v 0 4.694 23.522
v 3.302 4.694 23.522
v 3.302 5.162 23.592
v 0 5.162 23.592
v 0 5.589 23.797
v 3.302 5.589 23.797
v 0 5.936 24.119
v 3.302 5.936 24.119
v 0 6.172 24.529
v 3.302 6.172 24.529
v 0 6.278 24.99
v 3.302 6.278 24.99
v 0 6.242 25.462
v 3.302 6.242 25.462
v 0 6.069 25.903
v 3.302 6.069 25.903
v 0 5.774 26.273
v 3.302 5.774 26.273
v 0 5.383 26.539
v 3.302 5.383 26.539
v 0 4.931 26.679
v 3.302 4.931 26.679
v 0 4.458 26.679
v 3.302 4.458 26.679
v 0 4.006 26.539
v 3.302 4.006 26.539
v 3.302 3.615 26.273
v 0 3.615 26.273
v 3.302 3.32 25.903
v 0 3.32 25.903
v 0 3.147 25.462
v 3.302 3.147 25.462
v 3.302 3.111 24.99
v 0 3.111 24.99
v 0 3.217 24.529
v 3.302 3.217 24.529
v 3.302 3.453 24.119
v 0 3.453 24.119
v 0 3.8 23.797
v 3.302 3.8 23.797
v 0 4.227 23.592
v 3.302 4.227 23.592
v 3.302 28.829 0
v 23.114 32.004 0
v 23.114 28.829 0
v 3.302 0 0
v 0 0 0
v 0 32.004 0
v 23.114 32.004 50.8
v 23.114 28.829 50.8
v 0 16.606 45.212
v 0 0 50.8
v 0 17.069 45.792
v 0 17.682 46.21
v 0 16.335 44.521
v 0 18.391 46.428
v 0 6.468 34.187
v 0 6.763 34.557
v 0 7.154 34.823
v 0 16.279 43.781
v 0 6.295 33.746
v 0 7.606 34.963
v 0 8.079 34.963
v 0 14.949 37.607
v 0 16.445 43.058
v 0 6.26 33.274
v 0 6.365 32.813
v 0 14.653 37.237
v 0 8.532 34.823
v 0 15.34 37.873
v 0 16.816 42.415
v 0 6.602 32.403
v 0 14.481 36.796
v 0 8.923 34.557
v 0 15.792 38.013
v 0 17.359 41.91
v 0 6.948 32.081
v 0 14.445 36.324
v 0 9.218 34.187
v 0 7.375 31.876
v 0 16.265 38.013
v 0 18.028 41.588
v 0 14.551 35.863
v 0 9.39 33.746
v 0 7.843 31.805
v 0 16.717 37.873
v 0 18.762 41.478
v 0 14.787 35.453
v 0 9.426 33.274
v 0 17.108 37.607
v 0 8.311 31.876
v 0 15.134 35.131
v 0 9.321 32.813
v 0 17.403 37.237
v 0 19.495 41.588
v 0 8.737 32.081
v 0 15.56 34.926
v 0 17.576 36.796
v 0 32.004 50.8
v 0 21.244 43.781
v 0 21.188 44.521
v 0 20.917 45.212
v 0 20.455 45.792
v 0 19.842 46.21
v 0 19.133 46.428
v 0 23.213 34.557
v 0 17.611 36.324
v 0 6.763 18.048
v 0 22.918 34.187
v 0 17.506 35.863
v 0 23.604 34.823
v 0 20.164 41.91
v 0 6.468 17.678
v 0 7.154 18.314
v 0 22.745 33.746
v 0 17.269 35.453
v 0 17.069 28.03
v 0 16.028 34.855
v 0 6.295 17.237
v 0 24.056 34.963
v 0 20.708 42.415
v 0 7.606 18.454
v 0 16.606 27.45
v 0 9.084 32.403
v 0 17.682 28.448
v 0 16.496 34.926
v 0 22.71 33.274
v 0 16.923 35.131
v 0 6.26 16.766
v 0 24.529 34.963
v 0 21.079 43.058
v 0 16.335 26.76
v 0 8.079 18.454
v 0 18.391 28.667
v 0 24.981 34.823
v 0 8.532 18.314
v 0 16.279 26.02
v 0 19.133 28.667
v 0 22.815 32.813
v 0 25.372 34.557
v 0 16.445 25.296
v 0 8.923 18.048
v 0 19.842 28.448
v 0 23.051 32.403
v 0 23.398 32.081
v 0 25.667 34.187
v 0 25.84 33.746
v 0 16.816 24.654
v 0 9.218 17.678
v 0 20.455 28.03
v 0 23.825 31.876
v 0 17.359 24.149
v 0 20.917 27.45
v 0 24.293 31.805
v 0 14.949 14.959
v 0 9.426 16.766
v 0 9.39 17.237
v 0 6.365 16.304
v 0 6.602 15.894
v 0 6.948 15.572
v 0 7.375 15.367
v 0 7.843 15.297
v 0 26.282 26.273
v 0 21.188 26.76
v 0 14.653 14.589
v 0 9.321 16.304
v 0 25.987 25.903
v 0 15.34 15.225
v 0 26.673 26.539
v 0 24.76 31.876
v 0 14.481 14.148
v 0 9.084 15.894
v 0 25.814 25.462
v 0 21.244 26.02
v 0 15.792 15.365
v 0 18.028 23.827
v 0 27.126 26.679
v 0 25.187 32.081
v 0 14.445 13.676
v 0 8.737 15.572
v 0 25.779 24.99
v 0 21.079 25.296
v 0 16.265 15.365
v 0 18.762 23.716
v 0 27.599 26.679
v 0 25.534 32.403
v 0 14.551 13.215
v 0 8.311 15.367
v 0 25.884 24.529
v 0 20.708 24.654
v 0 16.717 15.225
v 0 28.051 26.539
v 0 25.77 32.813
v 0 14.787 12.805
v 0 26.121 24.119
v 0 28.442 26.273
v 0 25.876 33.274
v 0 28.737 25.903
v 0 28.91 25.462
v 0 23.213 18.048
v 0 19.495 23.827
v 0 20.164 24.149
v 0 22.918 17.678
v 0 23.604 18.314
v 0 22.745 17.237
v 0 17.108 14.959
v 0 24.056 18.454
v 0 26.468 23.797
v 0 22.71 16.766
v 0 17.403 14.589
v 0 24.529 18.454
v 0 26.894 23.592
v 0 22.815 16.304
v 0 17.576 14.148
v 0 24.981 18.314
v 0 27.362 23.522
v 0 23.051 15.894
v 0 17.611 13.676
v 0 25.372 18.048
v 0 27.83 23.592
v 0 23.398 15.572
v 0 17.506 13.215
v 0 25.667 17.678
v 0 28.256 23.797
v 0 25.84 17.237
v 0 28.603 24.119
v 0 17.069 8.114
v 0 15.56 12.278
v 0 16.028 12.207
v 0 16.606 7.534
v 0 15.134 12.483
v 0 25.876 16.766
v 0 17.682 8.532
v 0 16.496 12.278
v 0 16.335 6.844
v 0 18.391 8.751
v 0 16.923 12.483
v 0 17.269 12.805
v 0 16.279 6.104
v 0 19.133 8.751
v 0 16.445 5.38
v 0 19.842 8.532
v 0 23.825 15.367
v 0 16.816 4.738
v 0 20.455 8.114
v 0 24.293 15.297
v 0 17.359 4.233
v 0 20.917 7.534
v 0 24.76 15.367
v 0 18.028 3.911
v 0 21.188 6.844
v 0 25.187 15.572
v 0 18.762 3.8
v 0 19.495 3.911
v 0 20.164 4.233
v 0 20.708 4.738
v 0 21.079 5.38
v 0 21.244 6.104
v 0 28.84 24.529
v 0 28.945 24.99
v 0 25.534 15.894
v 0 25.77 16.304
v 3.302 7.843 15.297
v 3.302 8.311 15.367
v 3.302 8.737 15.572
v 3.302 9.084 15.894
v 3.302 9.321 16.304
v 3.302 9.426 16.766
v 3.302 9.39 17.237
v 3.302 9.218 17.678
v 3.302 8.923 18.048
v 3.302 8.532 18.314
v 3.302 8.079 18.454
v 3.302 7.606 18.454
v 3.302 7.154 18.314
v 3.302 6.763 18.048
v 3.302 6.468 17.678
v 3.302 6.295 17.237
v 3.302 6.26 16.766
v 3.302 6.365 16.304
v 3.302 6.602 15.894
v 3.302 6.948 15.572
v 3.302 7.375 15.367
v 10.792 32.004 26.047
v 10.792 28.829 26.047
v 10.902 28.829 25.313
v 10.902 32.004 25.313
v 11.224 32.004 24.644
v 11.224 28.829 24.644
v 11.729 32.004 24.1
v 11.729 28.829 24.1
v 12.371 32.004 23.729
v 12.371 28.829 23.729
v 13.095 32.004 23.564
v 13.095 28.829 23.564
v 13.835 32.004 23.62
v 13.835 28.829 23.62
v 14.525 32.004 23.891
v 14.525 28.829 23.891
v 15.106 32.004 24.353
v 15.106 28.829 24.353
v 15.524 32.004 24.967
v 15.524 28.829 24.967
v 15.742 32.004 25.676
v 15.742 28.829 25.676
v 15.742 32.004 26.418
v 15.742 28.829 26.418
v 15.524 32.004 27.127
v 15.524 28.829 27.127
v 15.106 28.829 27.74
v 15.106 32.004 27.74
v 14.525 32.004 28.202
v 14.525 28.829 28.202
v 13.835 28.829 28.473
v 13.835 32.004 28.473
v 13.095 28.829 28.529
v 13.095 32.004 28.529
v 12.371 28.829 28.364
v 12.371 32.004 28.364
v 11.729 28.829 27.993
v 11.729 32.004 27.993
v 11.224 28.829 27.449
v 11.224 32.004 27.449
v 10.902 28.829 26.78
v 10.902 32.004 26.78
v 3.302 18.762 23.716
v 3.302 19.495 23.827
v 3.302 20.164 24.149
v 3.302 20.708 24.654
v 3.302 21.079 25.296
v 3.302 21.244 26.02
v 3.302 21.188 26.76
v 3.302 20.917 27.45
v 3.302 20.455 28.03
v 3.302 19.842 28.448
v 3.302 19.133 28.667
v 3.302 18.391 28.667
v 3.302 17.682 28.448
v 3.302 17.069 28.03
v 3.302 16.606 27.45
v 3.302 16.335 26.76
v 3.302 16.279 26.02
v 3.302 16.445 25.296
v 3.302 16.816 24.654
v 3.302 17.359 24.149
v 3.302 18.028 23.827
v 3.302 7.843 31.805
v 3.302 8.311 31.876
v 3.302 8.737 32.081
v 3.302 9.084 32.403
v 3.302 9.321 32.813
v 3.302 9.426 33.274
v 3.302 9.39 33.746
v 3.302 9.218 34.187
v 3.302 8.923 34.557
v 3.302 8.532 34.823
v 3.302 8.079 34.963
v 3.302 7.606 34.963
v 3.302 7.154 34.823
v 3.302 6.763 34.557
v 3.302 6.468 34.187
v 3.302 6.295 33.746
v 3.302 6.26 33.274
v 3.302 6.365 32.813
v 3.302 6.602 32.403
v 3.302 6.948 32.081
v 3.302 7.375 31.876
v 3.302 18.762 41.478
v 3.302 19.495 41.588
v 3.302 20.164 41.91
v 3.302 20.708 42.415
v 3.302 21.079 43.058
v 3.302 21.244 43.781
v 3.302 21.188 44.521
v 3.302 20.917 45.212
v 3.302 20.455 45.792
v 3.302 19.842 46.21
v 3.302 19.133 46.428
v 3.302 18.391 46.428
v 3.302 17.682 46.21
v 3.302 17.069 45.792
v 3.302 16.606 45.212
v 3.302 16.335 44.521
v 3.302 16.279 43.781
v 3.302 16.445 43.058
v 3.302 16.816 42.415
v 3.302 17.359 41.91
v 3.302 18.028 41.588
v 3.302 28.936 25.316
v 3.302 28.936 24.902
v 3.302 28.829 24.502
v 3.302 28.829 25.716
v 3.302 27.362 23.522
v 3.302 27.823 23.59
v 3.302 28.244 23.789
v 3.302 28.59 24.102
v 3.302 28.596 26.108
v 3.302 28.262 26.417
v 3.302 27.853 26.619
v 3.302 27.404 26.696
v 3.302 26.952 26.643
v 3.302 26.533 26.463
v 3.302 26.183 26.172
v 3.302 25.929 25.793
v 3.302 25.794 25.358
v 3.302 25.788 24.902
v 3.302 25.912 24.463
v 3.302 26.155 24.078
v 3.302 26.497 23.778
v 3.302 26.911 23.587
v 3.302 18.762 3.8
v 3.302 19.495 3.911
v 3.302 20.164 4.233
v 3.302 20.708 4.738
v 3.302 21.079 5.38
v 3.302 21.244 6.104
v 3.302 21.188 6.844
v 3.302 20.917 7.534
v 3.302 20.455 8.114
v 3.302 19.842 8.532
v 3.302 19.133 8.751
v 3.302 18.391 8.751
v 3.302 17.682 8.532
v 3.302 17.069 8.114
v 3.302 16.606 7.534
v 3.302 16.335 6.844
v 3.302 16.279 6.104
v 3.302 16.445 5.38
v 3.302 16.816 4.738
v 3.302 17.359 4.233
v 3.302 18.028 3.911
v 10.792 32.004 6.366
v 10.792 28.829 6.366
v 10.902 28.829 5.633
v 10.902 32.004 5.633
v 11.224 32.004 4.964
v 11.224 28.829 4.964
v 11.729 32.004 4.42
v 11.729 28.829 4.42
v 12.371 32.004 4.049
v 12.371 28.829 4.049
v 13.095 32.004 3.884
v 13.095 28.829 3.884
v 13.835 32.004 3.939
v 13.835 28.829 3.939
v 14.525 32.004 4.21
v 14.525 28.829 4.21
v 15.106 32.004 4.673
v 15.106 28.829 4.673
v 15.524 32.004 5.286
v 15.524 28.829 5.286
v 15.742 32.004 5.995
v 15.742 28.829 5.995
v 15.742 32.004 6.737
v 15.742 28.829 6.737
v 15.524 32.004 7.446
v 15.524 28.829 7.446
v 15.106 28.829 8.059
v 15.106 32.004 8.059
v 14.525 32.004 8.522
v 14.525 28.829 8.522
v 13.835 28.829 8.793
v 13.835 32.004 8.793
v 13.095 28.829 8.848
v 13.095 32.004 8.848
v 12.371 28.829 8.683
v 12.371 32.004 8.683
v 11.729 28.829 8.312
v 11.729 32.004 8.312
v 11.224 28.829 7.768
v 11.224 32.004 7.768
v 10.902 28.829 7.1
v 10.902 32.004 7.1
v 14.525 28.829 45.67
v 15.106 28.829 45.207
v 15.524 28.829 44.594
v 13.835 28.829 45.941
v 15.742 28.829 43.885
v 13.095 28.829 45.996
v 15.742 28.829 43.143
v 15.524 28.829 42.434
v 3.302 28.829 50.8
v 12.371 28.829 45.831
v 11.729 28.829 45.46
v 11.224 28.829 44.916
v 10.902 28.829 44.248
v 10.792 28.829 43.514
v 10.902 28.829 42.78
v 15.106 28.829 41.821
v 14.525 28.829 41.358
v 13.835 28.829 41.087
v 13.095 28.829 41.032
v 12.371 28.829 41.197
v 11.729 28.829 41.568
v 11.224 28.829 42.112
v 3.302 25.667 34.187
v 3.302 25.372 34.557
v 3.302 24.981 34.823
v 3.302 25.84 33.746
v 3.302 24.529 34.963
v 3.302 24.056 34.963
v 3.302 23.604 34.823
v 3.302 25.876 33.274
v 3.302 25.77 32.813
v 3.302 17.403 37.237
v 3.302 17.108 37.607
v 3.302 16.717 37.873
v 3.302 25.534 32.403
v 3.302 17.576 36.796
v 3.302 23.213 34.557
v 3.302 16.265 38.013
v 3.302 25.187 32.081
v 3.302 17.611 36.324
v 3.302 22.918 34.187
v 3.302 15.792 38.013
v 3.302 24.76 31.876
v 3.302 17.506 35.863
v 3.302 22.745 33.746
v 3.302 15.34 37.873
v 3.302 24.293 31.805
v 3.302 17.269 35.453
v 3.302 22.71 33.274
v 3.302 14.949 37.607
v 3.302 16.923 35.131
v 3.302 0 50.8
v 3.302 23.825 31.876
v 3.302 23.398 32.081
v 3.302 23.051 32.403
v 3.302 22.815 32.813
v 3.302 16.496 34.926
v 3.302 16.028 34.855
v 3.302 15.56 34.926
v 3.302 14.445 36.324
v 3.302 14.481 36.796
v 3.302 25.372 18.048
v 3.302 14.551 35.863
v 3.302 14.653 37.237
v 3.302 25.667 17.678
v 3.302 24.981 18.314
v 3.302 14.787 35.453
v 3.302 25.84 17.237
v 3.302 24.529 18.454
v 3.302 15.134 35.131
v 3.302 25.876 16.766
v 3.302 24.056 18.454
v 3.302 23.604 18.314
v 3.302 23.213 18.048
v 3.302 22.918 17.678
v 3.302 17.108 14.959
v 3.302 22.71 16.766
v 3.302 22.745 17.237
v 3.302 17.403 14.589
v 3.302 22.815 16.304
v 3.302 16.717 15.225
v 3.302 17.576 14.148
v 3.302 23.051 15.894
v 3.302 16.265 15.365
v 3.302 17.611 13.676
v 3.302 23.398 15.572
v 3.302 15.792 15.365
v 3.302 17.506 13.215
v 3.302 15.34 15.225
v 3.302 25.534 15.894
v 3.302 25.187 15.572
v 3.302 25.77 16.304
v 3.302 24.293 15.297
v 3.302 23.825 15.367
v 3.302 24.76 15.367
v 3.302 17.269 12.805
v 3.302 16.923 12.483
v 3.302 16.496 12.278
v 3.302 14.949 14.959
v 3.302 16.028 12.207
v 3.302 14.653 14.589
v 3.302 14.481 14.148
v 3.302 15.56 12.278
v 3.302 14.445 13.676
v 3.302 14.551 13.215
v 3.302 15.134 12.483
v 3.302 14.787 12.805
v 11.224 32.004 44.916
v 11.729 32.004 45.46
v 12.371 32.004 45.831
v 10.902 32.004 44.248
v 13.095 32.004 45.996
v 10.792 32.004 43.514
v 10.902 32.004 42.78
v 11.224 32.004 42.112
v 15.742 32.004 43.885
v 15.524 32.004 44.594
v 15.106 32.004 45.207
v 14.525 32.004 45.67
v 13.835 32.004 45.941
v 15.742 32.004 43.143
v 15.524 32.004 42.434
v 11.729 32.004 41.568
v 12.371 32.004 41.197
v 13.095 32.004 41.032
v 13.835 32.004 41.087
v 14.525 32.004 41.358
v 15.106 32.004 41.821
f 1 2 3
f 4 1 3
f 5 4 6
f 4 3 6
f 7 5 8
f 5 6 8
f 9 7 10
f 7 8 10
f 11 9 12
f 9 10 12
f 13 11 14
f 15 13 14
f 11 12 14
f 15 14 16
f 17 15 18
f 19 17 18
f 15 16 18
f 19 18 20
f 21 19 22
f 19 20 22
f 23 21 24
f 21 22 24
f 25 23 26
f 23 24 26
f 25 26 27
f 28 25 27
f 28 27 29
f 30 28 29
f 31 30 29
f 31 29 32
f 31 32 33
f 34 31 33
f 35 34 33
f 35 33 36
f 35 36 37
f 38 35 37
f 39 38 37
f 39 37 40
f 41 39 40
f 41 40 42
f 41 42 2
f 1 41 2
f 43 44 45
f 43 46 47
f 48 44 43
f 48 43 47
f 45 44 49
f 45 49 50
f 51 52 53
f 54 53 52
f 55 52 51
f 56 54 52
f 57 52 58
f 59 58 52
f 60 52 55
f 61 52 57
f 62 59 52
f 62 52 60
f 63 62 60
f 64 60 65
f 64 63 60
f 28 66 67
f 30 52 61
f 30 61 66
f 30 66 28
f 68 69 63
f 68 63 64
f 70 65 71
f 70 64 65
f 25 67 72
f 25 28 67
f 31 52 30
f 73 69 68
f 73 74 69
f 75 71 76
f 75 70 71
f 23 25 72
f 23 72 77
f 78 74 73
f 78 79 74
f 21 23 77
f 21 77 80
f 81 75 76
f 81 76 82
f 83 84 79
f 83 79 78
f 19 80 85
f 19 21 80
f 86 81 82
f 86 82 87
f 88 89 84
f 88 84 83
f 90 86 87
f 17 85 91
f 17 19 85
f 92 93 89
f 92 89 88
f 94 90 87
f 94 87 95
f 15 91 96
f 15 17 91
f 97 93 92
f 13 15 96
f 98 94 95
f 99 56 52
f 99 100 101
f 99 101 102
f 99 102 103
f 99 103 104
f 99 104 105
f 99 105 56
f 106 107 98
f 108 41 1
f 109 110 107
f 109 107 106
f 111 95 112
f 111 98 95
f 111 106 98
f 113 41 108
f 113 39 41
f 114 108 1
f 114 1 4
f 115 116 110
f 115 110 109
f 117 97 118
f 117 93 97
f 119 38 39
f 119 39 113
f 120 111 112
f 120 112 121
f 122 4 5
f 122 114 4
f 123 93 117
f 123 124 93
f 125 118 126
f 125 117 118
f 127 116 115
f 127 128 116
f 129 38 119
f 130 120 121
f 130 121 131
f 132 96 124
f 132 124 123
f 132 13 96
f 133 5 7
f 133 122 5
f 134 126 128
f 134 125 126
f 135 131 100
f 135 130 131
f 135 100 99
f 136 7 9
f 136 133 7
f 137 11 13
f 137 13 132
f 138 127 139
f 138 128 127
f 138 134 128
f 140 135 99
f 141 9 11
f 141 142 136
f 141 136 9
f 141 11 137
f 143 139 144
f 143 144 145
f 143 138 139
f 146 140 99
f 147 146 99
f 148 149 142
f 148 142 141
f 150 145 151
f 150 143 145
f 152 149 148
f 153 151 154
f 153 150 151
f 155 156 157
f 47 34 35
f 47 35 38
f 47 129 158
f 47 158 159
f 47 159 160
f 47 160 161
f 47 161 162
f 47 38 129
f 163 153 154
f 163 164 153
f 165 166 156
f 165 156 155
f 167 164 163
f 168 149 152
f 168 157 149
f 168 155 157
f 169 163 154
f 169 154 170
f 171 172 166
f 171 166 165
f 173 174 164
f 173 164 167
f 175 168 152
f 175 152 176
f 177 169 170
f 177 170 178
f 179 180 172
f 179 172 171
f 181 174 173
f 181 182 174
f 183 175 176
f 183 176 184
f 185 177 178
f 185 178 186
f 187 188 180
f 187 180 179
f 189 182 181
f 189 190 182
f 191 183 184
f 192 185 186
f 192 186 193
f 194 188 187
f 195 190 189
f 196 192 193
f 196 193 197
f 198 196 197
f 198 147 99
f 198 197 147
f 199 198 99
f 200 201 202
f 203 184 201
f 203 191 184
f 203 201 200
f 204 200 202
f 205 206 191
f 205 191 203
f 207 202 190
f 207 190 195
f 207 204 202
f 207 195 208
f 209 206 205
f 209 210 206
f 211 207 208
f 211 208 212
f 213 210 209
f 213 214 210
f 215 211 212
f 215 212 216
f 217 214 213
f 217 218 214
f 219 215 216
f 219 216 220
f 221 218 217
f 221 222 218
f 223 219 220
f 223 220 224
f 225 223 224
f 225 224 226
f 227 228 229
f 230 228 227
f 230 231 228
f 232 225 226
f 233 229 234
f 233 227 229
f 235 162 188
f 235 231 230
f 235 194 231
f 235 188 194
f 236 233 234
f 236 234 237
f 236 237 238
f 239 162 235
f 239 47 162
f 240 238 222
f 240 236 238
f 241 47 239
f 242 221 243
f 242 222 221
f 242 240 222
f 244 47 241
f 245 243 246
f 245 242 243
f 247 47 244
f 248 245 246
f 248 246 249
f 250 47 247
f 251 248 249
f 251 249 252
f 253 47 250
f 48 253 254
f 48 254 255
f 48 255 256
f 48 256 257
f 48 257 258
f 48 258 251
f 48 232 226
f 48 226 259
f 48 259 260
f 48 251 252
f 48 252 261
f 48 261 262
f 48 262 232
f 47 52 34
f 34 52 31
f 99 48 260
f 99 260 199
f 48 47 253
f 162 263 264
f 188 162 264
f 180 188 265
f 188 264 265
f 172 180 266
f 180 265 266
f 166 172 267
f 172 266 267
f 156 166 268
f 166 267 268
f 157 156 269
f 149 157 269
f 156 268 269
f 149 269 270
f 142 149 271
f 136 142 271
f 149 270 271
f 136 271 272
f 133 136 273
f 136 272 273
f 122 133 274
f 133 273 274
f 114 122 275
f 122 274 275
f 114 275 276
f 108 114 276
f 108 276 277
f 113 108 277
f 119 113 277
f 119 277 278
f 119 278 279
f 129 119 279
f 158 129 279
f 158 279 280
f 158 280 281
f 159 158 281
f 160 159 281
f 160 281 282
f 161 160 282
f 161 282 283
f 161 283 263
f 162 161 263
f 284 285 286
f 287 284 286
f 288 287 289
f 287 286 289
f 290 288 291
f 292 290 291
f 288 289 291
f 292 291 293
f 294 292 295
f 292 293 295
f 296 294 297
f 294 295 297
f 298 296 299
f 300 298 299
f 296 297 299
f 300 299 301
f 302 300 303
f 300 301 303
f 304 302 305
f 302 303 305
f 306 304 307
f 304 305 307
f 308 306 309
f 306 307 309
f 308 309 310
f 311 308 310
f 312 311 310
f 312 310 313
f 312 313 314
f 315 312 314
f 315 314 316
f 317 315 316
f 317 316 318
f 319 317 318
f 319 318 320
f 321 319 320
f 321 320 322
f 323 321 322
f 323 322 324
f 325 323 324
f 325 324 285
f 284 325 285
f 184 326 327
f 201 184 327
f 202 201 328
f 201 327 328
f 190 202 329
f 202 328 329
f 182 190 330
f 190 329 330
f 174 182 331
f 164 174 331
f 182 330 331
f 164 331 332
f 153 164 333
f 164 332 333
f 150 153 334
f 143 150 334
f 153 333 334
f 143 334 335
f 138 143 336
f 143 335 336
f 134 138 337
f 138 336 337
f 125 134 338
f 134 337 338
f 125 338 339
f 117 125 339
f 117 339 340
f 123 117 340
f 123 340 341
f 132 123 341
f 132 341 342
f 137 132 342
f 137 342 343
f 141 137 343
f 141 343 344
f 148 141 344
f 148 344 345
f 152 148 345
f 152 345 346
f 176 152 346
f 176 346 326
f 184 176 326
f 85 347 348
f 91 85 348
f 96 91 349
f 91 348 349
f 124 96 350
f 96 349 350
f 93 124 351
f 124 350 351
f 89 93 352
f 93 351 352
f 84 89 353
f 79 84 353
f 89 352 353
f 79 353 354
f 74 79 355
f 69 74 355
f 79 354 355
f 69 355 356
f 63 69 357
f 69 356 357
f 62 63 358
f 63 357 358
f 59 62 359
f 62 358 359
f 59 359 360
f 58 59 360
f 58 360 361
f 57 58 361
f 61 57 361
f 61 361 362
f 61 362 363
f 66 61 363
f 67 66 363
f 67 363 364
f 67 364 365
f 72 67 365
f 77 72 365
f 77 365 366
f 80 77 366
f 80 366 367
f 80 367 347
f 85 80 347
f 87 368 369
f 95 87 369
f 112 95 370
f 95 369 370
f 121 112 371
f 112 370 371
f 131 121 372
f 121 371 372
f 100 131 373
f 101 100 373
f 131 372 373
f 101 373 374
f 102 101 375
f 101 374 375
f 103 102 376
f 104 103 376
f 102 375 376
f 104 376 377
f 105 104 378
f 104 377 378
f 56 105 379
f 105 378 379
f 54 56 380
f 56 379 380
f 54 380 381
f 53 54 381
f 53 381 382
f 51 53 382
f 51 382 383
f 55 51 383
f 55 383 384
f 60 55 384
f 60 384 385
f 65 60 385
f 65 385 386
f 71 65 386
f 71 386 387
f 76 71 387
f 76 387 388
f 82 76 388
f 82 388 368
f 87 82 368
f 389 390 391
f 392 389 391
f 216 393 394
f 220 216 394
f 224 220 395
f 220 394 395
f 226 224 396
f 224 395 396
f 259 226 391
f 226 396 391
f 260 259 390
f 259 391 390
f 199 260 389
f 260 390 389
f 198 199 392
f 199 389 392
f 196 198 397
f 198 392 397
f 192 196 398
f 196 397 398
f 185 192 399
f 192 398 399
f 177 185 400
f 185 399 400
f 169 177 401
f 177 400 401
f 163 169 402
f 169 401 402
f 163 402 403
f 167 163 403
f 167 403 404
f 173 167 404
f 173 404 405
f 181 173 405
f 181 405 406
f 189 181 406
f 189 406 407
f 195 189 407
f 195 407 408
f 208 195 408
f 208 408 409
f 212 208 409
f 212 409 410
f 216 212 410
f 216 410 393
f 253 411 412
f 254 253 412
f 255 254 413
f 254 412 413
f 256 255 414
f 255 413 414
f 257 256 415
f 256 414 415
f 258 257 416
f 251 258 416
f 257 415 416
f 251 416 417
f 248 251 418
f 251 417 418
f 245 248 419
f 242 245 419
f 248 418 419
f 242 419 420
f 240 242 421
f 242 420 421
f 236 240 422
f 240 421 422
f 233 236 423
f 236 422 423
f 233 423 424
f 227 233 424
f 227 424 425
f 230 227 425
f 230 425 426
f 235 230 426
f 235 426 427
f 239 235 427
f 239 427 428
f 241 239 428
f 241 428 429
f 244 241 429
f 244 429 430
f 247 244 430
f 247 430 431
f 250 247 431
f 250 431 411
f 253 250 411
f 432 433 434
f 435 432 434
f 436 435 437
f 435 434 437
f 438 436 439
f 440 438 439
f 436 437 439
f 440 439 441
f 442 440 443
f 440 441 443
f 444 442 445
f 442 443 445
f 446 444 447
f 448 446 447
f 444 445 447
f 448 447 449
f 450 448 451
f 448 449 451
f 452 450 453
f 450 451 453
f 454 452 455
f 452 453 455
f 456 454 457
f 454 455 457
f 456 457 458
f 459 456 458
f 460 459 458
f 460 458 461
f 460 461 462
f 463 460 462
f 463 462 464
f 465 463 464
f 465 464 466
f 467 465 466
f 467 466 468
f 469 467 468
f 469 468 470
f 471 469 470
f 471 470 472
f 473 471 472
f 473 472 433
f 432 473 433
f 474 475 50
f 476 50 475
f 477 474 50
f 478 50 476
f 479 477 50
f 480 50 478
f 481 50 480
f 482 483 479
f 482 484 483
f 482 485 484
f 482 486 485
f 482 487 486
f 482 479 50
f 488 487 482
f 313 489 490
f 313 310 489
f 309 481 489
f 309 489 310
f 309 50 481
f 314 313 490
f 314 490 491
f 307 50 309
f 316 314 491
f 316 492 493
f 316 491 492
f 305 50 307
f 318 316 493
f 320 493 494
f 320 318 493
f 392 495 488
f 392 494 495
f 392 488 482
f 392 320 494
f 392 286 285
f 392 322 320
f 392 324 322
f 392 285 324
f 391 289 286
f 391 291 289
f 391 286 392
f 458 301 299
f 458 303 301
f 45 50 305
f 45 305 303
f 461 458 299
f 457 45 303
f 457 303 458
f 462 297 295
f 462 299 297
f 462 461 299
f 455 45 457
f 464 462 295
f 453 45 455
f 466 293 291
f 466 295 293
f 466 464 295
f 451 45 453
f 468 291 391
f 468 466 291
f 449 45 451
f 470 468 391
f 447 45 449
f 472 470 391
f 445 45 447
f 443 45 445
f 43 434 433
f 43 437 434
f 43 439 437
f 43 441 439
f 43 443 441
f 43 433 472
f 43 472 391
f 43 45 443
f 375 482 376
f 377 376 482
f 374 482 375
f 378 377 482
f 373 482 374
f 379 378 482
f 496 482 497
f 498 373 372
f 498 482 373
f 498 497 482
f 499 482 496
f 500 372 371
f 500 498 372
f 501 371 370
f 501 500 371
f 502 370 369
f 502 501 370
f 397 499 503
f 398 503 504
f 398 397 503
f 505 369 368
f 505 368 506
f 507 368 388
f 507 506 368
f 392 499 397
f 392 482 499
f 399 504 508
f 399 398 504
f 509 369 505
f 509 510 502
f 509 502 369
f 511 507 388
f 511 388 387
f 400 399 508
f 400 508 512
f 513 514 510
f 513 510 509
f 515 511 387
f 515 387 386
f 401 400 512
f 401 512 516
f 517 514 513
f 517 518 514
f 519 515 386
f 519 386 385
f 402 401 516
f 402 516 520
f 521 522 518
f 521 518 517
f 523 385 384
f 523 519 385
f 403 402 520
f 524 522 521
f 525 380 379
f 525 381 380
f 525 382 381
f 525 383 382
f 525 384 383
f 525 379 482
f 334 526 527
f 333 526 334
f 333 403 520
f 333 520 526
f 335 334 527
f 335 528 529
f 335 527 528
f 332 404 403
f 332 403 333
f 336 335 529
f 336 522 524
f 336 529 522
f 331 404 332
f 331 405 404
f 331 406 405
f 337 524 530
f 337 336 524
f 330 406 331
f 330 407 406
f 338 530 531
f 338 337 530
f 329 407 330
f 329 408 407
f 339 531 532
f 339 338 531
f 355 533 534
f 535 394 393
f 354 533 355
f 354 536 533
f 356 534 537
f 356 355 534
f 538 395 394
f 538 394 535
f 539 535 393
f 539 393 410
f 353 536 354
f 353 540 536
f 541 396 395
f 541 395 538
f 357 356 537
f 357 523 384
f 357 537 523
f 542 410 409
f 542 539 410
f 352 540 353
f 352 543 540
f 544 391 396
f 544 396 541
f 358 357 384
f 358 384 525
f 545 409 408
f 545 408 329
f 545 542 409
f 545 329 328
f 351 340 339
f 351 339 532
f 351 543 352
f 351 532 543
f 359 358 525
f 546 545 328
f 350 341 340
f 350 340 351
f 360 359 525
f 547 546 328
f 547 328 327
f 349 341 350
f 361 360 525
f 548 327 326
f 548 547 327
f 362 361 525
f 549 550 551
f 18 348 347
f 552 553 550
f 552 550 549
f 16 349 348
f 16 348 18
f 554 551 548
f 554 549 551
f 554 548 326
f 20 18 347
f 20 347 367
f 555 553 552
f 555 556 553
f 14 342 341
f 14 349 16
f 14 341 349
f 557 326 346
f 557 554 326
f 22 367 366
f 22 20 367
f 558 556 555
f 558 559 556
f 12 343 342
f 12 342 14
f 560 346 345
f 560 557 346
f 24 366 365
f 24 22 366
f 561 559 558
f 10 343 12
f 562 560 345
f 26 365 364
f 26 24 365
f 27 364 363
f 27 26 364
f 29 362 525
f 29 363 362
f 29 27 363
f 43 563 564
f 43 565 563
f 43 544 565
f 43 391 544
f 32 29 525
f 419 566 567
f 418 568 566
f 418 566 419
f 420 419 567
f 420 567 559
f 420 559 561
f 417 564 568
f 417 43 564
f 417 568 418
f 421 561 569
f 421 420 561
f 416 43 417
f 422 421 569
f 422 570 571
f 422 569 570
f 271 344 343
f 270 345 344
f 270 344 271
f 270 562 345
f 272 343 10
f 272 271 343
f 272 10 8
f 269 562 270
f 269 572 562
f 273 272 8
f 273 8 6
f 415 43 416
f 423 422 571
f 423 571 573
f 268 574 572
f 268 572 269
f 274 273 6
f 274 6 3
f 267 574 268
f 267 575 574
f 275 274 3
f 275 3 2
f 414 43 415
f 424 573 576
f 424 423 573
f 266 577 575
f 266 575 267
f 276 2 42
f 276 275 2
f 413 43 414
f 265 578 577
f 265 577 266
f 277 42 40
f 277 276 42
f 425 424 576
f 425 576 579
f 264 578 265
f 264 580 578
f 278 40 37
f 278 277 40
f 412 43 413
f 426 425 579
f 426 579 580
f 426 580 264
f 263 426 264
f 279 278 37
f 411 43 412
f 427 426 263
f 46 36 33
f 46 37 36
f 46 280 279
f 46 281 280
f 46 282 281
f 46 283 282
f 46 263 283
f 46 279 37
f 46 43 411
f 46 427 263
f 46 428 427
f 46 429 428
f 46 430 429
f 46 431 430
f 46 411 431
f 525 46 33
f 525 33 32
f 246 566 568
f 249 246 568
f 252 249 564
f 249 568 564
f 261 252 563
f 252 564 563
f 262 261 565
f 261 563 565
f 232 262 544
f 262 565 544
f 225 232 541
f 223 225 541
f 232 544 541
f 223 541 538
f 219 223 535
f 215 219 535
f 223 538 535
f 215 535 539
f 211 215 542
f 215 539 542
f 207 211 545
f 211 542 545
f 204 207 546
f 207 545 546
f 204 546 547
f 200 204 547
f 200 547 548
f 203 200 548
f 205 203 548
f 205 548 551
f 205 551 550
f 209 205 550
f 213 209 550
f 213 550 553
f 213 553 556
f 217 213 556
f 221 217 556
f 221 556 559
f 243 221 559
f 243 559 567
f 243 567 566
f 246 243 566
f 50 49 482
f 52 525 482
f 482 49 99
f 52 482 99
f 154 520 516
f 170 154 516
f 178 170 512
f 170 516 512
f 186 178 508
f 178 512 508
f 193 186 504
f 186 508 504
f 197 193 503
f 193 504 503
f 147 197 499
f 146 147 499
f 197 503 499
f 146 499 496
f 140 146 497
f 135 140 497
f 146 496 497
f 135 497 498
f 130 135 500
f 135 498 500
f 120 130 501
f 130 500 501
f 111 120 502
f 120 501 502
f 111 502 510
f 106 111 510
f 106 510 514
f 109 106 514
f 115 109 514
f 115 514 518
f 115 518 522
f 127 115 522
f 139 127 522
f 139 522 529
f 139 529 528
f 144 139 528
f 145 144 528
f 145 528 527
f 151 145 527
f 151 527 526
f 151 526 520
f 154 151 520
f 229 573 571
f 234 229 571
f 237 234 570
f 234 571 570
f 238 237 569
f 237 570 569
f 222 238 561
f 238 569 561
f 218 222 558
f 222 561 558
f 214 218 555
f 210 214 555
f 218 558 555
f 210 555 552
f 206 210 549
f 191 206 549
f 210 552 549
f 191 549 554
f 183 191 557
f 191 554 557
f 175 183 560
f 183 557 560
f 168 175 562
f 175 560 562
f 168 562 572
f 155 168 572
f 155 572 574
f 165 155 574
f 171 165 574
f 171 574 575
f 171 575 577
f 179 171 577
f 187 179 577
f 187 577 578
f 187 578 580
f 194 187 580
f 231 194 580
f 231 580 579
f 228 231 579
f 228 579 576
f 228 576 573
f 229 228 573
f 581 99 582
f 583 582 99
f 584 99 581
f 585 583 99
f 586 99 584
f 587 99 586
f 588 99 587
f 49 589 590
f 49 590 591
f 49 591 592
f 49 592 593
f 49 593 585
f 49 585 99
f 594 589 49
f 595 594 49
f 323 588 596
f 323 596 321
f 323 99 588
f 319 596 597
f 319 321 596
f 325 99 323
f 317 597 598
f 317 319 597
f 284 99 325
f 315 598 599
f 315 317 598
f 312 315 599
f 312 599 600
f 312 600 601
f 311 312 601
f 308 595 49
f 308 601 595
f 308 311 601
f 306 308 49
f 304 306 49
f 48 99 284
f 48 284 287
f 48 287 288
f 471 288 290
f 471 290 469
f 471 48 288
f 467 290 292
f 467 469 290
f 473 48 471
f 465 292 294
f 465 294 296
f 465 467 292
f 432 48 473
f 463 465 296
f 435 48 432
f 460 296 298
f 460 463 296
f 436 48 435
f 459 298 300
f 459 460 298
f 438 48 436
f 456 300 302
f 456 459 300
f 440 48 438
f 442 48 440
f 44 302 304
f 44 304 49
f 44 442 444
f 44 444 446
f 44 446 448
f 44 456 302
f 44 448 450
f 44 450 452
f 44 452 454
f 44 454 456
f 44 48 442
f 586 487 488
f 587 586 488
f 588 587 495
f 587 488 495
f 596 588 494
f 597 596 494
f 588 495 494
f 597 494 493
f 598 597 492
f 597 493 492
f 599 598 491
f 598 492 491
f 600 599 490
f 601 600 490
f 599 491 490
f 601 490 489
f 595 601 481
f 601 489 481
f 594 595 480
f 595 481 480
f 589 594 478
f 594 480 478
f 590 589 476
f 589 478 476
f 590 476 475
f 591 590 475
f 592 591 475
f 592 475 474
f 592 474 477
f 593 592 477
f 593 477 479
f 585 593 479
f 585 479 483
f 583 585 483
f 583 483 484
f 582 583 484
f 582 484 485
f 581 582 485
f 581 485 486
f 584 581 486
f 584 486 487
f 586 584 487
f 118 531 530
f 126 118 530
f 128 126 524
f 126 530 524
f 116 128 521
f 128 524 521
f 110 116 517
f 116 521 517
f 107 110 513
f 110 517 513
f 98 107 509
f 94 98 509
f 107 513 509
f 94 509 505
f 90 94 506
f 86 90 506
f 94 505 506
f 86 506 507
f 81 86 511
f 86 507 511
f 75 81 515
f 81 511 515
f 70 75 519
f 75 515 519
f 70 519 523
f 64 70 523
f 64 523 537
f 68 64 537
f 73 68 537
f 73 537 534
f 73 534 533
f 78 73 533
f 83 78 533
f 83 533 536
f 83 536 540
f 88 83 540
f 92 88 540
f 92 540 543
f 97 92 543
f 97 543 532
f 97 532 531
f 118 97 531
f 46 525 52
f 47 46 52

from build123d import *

# Parameters (mm, degrees)
BOSS_EXTRUDE1_DEPTH              = 50.8
F_9_0_196_DIAMETER_HOLE2_D       = 4.9784
F_9_0_196_DIAMETER_HOLE3_D       = 4.9784
F_1_8_0_125_DIAMETER_HOLE1_D     = 3.175
F_1_8_0_125_DIAMETER_HOLE1_DEPTH = 3.302


with BuildPart() as part:
    # Sketch1 → Boss-Extrude1 (new body)
    with BuildSketch(Plane.XY):
        Polygon((0, 0), (0, 32.004), (23.114, 32.004), (23.114, 28.829), (3.302, 28.829), (3.302, 0), align=None)
    extrude(amount=BOSS_EXTRUDE1_DEPTH)

    # #9 (0.196) Diameter Hole2 (through all)
    with Locations(Plane(origin=(0, 32.004, 0), x_dir=(1, 0, 0), z_dir=(0, 1, 0))):
        with Locations((13.280812395, -26.046570346), (13.280812395, -6.366207965), (13.280812395, -43.514069015)):
            Hole(F_9_0_196_DIAMETER_HOLE2_D / 2)

    # #9 (0.196) Diameter Hole3 (through all)
    with Locations(Plane.ZY):
        with Locations((6.2896856, 18.761683292), (26.205635925, 18.761683292), (43.966936654, 18.761683292)):
            Hole(F_9_0_196_DIAMETER_HOLE3_D / 2)

    # 1/8 (0.125) Diameter Hole1
    with Locations(Plane.ZY):
        with Locations((36.442896127, 16.028307276), (33.392991473, 7.842756721), (25.109056897, 4.694468046), (16.884152733, 7.842756721), (13.794894471, 16.028307276), (16.884152733, 24.292565048), (25.109056897, 27.362146507), (33.392991473, 24.292565048)):
            Hole(F_1_8_0_125_DIAMETER_HOLE1_D / 2, depth=F_1_8_0_125_DIAMETER_HOLE1_DEPTH)


solid = part.part
